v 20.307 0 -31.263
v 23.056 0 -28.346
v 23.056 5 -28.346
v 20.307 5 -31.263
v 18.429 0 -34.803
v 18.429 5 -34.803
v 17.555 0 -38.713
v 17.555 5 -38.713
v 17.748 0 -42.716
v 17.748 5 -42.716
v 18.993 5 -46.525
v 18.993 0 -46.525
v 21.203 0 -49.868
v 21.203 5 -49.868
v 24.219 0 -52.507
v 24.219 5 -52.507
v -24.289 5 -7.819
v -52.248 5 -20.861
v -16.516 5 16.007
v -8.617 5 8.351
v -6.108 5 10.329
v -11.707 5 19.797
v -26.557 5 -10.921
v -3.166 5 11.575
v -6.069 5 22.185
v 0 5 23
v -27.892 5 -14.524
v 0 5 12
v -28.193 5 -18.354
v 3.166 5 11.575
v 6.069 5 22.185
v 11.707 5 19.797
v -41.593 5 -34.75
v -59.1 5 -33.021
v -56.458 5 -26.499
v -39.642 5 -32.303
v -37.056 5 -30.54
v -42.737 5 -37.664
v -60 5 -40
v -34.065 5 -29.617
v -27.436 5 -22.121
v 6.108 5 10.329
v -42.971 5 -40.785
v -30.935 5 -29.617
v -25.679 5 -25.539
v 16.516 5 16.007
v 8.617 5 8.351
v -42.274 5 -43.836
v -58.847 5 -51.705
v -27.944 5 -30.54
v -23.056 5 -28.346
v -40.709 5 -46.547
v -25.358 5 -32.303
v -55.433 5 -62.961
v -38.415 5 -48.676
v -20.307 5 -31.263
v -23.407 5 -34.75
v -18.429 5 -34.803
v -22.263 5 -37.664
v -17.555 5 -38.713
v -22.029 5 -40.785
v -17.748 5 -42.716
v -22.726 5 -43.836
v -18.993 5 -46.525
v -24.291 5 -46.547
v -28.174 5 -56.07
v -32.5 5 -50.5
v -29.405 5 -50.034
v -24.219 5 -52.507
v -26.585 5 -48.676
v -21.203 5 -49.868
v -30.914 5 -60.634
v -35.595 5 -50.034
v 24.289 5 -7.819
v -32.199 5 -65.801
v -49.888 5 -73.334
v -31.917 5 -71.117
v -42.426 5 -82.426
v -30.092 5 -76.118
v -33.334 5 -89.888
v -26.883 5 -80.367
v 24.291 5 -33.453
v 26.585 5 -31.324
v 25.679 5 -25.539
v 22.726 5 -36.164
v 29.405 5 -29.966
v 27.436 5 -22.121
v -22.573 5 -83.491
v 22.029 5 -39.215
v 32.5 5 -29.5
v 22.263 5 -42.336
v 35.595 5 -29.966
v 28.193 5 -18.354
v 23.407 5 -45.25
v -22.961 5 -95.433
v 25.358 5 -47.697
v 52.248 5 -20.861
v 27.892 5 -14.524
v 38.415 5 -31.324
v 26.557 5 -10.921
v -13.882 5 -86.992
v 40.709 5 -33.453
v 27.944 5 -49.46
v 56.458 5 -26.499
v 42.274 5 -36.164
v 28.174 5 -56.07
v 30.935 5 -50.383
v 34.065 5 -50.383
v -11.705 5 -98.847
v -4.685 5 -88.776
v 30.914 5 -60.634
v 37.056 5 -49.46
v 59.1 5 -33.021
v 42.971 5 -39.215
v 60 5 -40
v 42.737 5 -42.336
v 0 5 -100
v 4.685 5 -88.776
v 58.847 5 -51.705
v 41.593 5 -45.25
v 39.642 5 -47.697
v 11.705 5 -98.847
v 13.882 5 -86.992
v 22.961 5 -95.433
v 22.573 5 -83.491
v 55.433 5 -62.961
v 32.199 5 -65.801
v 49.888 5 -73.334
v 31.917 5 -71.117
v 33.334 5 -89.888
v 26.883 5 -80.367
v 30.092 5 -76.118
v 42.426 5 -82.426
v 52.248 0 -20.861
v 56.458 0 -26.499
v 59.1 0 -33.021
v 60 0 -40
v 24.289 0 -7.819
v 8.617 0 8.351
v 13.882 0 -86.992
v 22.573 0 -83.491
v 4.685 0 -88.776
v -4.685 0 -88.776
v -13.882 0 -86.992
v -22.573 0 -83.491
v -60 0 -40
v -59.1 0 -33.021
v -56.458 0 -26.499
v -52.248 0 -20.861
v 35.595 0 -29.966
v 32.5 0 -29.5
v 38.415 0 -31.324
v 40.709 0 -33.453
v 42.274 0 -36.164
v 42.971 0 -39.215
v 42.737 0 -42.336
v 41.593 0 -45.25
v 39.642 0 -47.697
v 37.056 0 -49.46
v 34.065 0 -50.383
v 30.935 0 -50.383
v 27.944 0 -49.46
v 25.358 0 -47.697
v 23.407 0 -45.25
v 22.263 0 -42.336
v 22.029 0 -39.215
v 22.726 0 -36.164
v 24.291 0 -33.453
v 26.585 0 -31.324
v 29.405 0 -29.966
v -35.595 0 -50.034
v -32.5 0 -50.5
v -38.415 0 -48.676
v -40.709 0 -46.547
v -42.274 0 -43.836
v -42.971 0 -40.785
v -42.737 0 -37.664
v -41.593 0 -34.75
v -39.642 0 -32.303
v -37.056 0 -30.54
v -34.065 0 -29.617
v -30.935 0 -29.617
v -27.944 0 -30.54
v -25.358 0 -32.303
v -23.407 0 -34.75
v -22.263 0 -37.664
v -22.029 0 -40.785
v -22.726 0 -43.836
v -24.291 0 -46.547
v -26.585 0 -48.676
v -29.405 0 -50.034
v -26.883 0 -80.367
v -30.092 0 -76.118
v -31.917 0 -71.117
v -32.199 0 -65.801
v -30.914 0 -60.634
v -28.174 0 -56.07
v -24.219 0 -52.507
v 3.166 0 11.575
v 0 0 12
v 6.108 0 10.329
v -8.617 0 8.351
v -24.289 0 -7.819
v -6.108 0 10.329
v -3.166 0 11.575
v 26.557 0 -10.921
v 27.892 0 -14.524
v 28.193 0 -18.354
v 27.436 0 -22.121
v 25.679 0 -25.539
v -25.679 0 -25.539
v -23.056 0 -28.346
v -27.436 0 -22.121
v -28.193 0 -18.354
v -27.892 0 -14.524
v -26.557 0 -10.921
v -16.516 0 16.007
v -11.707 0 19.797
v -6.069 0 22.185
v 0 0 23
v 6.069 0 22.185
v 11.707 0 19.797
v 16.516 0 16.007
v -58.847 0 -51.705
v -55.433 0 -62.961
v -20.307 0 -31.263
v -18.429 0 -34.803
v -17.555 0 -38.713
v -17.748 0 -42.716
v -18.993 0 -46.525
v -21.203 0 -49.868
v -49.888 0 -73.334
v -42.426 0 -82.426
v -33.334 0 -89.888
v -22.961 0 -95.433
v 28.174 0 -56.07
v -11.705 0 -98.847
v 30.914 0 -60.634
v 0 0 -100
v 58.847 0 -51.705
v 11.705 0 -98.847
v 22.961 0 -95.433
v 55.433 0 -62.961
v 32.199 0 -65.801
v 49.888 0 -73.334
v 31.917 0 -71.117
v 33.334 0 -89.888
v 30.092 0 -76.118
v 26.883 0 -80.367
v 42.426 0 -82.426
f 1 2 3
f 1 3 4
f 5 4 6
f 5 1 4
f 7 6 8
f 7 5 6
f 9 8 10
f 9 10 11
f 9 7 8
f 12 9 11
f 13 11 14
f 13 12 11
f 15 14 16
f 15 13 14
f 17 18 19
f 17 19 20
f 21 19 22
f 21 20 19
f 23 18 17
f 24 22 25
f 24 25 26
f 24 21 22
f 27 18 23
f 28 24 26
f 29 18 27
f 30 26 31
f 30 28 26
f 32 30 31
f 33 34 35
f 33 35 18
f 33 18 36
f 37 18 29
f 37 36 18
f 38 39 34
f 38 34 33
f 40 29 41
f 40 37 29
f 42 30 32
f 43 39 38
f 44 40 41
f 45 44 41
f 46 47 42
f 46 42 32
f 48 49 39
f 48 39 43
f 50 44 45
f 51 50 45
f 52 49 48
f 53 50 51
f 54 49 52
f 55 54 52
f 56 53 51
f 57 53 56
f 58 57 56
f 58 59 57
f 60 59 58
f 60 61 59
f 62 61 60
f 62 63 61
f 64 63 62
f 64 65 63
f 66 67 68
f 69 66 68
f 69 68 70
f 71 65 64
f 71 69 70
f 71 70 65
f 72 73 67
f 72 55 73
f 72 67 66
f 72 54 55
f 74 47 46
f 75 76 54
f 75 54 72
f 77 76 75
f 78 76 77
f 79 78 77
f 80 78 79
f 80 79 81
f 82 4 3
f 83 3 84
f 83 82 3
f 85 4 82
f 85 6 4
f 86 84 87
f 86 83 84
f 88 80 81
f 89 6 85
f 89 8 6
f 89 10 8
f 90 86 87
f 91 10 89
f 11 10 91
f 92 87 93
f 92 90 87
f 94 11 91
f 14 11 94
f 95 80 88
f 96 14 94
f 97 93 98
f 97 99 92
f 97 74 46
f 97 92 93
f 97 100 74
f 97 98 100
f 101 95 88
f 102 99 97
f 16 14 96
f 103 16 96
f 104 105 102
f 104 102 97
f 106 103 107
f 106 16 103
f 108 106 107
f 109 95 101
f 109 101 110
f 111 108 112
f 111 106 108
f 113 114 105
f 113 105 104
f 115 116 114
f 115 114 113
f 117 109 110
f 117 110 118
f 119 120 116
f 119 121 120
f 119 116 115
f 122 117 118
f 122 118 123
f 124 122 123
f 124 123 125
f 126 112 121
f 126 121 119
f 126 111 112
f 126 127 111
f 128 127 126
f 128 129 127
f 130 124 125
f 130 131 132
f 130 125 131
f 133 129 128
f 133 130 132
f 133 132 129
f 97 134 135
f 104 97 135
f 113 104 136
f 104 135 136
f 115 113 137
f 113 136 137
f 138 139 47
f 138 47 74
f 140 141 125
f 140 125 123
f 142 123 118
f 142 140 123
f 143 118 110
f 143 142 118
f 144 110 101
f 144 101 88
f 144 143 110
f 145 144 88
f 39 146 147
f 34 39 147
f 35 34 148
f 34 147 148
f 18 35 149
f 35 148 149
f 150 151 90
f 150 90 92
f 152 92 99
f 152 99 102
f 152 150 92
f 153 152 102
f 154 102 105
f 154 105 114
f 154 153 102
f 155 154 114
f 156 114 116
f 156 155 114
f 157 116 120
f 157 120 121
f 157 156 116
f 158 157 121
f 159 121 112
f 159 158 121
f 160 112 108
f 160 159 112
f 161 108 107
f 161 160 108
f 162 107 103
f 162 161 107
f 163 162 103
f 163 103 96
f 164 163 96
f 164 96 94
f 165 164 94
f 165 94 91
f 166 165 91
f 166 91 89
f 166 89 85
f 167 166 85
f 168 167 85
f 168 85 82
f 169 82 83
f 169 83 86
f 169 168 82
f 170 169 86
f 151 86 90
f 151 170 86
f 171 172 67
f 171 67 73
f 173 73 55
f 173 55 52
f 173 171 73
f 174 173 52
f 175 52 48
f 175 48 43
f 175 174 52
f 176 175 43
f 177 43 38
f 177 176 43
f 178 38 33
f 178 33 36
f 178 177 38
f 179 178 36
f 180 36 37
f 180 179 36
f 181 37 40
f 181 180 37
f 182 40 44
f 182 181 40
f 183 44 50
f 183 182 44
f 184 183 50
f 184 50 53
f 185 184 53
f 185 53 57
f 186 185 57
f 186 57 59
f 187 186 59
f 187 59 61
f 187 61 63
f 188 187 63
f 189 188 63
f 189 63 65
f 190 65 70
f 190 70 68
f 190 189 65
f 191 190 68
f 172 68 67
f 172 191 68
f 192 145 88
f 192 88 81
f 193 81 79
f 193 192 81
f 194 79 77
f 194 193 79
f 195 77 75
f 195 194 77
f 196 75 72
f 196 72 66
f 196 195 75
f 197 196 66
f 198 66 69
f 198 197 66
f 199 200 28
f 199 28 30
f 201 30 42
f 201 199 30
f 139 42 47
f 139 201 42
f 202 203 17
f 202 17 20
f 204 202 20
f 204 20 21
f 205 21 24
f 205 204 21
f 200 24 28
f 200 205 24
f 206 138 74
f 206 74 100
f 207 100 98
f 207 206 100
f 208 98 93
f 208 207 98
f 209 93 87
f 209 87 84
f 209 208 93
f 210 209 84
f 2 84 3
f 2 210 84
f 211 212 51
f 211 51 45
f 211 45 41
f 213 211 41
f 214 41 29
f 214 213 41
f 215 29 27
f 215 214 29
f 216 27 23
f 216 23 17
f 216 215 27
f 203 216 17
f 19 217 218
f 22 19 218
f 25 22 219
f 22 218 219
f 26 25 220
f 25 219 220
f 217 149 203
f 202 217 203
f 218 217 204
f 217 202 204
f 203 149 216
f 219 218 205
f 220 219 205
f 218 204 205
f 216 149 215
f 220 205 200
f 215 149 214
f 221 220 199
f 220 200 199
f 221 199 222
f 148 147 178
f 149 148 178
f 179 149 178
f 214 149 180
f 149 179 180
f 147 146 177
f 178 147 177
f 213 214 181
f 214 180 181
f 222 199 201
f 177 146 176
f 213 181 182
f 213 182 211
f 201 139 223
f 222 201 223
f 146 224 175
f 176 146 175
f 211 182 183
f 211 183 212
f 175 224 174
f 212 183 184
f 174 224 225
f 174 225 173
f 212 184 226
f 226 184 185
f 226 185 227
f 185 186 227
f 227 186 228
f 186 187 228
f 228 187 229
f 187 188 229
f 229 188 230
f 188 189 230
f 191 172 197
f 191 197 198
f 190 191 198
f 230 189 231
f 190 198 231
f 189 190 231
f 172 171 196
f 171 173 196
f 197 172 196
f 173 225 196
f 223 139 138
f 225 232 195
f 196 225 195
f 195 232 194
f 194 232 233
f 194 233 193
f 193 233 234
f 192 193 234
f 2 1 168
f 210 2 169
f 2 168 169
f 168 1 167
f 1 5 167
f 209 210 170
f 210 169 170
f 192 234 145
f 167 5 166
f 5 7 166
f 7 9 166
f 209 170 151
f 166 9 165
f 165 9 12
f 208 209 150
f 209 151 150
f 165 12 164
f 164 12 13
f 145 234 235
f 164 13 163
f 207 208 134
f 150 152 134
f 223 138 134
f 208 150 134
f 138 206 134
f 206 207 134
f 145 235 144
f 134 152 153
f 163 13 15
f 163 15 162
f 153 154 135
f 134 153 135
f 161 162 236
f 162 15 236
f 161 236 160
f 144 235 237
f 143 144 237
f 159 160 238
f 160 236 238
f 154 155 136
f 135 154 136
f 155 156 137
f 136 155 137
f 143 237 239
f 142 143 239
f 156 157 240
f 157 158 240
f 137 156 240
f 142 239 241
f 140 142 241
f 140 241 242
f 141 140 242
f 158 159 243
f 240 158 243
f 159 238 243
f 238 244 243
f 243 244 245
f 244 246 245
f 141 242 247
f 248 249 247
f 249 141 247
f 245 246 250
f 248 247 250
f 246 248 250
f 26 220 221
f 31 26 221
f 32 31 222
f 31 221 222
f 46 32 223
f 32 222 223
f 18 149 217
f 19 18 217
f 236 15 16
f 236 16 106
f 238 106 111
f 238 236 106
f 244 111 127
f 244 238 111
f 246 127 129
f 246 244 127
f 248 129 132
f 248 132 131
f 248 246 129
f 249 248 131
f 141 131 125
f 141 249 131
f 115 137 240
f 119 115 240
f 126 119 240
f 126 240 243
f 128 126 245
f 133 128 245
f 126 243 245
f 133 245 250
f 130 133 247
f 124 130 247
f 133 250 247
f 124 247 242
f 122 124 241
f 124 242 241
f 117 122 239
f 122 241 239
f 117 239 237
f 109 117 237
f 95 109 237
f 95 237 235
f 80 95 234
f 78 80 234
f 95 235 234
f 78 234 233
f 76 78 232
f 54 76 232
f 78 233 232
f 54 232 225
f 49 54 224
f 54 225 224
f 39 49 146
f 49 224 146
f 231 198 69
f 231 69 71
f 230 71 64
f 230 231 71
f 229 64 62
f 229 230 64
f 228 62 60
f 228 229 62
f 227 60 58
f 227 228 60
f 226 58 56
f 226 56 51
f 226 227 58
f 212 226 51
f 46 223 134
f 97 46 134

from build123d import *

# Parameters (mm, degrees)
SKETCH1_R           = 10.5
BOSS_EXTRUDE2_DEPTH = 5


with BuildPart() as part:
    # Sketch1 → Boss-Extrude2 (new body)
    with BuildSketch(Plane(origin=(0, 0, 0), x_dir=(1, 0, 0), z_dir=(0, 1, 0))):
        with BuildLine():
            Line((16.516096513, -16.006828417), (52.2475067, 20.861400806))
            ThreePointArc((52.2475067, 20.861400806), (57.988295689, 29.675428199), (60, 40))
            ThreePointArc((60, 40), (42.426406871, 82.426406871), (0, 100))
            ThreePointArc((0, 100), (-42.426406871, 82.426406871), (-60, 40))
            ThreePointArc((-60, 40), (-57.988295689, 29.675428199), (-52.2475067, 20.861400806))
            Line((-52.2475067, 20.861400806), (-16.516096513, -16.006828417))
            ThreePointArc((-16.516096513, -16.006828417), (-8.967802028, -21.17967249), (0, -23))
            ThreePointArc((0, -23), (8.967802028, -21.17967249), (16.516096513, -16.006828417))
        make_face()
        with Locations(Location((32.5, 40, 0), (0, 0, 270))):
            Circle(SKETCH1_R, mode=Mode.SUBTRACT)
        with Locations(Location((-32.5, 40, 0), (0, 0, 90))):
            Circle(SKETCH1_R, mode=Mode.SUBTRACT)
        with BuildLine():
            Line((8.617093833, -8.351388739), (24.288887892, 7.819014071))
            ThreePointArc((24.288887892, 7.819014071), (28.192805121, 18.354250949), (23.055780503, 28.34638605))
            ThreePointArc((23.055780503, 28.34638605), (17.517341086, 40.721063014), (24.218531469, 52.506689369))
            ThreePointArc((24.218531469, 52.506689369), (32.255432897, 68.469423949), (22.572828784, 83.491003675))
            ThreePointArc((22.572828784, 83.491003675), (0, 89), (-22.572828784, 83.491003675))
            ThreePointArc((-22.572828784, 83.491003675), (-32.255432897, 68.469423949), (-24.218531469, 52.506689369))
            ThreePointArc((-24.218531469, 52.506689369), (-17.517341086, 40.721063014), (-23.055780503, 28.34638605))
            ThreePointArc((-23.055780503, 28.34638605), (-28.192805121, 18.354250949), (-24.288887892, 7.819014071))
            Line((-24.288887892, 7.819014071), (-8.617093833, -8.351388739))
            ThreePointArc((-8.617093833, -8.351388739), (-4.678853232, -11.050263908), (0, -12))
            ThreePointArc((0, -12), (4.678853232, -11.050263908), (8.617093833, -8.351388739))
        make_face(mode=Mode.SUBTRACT)
    extrude(amount=BOSS_EXTRUDE2_DEPTH)


solid = part.part
